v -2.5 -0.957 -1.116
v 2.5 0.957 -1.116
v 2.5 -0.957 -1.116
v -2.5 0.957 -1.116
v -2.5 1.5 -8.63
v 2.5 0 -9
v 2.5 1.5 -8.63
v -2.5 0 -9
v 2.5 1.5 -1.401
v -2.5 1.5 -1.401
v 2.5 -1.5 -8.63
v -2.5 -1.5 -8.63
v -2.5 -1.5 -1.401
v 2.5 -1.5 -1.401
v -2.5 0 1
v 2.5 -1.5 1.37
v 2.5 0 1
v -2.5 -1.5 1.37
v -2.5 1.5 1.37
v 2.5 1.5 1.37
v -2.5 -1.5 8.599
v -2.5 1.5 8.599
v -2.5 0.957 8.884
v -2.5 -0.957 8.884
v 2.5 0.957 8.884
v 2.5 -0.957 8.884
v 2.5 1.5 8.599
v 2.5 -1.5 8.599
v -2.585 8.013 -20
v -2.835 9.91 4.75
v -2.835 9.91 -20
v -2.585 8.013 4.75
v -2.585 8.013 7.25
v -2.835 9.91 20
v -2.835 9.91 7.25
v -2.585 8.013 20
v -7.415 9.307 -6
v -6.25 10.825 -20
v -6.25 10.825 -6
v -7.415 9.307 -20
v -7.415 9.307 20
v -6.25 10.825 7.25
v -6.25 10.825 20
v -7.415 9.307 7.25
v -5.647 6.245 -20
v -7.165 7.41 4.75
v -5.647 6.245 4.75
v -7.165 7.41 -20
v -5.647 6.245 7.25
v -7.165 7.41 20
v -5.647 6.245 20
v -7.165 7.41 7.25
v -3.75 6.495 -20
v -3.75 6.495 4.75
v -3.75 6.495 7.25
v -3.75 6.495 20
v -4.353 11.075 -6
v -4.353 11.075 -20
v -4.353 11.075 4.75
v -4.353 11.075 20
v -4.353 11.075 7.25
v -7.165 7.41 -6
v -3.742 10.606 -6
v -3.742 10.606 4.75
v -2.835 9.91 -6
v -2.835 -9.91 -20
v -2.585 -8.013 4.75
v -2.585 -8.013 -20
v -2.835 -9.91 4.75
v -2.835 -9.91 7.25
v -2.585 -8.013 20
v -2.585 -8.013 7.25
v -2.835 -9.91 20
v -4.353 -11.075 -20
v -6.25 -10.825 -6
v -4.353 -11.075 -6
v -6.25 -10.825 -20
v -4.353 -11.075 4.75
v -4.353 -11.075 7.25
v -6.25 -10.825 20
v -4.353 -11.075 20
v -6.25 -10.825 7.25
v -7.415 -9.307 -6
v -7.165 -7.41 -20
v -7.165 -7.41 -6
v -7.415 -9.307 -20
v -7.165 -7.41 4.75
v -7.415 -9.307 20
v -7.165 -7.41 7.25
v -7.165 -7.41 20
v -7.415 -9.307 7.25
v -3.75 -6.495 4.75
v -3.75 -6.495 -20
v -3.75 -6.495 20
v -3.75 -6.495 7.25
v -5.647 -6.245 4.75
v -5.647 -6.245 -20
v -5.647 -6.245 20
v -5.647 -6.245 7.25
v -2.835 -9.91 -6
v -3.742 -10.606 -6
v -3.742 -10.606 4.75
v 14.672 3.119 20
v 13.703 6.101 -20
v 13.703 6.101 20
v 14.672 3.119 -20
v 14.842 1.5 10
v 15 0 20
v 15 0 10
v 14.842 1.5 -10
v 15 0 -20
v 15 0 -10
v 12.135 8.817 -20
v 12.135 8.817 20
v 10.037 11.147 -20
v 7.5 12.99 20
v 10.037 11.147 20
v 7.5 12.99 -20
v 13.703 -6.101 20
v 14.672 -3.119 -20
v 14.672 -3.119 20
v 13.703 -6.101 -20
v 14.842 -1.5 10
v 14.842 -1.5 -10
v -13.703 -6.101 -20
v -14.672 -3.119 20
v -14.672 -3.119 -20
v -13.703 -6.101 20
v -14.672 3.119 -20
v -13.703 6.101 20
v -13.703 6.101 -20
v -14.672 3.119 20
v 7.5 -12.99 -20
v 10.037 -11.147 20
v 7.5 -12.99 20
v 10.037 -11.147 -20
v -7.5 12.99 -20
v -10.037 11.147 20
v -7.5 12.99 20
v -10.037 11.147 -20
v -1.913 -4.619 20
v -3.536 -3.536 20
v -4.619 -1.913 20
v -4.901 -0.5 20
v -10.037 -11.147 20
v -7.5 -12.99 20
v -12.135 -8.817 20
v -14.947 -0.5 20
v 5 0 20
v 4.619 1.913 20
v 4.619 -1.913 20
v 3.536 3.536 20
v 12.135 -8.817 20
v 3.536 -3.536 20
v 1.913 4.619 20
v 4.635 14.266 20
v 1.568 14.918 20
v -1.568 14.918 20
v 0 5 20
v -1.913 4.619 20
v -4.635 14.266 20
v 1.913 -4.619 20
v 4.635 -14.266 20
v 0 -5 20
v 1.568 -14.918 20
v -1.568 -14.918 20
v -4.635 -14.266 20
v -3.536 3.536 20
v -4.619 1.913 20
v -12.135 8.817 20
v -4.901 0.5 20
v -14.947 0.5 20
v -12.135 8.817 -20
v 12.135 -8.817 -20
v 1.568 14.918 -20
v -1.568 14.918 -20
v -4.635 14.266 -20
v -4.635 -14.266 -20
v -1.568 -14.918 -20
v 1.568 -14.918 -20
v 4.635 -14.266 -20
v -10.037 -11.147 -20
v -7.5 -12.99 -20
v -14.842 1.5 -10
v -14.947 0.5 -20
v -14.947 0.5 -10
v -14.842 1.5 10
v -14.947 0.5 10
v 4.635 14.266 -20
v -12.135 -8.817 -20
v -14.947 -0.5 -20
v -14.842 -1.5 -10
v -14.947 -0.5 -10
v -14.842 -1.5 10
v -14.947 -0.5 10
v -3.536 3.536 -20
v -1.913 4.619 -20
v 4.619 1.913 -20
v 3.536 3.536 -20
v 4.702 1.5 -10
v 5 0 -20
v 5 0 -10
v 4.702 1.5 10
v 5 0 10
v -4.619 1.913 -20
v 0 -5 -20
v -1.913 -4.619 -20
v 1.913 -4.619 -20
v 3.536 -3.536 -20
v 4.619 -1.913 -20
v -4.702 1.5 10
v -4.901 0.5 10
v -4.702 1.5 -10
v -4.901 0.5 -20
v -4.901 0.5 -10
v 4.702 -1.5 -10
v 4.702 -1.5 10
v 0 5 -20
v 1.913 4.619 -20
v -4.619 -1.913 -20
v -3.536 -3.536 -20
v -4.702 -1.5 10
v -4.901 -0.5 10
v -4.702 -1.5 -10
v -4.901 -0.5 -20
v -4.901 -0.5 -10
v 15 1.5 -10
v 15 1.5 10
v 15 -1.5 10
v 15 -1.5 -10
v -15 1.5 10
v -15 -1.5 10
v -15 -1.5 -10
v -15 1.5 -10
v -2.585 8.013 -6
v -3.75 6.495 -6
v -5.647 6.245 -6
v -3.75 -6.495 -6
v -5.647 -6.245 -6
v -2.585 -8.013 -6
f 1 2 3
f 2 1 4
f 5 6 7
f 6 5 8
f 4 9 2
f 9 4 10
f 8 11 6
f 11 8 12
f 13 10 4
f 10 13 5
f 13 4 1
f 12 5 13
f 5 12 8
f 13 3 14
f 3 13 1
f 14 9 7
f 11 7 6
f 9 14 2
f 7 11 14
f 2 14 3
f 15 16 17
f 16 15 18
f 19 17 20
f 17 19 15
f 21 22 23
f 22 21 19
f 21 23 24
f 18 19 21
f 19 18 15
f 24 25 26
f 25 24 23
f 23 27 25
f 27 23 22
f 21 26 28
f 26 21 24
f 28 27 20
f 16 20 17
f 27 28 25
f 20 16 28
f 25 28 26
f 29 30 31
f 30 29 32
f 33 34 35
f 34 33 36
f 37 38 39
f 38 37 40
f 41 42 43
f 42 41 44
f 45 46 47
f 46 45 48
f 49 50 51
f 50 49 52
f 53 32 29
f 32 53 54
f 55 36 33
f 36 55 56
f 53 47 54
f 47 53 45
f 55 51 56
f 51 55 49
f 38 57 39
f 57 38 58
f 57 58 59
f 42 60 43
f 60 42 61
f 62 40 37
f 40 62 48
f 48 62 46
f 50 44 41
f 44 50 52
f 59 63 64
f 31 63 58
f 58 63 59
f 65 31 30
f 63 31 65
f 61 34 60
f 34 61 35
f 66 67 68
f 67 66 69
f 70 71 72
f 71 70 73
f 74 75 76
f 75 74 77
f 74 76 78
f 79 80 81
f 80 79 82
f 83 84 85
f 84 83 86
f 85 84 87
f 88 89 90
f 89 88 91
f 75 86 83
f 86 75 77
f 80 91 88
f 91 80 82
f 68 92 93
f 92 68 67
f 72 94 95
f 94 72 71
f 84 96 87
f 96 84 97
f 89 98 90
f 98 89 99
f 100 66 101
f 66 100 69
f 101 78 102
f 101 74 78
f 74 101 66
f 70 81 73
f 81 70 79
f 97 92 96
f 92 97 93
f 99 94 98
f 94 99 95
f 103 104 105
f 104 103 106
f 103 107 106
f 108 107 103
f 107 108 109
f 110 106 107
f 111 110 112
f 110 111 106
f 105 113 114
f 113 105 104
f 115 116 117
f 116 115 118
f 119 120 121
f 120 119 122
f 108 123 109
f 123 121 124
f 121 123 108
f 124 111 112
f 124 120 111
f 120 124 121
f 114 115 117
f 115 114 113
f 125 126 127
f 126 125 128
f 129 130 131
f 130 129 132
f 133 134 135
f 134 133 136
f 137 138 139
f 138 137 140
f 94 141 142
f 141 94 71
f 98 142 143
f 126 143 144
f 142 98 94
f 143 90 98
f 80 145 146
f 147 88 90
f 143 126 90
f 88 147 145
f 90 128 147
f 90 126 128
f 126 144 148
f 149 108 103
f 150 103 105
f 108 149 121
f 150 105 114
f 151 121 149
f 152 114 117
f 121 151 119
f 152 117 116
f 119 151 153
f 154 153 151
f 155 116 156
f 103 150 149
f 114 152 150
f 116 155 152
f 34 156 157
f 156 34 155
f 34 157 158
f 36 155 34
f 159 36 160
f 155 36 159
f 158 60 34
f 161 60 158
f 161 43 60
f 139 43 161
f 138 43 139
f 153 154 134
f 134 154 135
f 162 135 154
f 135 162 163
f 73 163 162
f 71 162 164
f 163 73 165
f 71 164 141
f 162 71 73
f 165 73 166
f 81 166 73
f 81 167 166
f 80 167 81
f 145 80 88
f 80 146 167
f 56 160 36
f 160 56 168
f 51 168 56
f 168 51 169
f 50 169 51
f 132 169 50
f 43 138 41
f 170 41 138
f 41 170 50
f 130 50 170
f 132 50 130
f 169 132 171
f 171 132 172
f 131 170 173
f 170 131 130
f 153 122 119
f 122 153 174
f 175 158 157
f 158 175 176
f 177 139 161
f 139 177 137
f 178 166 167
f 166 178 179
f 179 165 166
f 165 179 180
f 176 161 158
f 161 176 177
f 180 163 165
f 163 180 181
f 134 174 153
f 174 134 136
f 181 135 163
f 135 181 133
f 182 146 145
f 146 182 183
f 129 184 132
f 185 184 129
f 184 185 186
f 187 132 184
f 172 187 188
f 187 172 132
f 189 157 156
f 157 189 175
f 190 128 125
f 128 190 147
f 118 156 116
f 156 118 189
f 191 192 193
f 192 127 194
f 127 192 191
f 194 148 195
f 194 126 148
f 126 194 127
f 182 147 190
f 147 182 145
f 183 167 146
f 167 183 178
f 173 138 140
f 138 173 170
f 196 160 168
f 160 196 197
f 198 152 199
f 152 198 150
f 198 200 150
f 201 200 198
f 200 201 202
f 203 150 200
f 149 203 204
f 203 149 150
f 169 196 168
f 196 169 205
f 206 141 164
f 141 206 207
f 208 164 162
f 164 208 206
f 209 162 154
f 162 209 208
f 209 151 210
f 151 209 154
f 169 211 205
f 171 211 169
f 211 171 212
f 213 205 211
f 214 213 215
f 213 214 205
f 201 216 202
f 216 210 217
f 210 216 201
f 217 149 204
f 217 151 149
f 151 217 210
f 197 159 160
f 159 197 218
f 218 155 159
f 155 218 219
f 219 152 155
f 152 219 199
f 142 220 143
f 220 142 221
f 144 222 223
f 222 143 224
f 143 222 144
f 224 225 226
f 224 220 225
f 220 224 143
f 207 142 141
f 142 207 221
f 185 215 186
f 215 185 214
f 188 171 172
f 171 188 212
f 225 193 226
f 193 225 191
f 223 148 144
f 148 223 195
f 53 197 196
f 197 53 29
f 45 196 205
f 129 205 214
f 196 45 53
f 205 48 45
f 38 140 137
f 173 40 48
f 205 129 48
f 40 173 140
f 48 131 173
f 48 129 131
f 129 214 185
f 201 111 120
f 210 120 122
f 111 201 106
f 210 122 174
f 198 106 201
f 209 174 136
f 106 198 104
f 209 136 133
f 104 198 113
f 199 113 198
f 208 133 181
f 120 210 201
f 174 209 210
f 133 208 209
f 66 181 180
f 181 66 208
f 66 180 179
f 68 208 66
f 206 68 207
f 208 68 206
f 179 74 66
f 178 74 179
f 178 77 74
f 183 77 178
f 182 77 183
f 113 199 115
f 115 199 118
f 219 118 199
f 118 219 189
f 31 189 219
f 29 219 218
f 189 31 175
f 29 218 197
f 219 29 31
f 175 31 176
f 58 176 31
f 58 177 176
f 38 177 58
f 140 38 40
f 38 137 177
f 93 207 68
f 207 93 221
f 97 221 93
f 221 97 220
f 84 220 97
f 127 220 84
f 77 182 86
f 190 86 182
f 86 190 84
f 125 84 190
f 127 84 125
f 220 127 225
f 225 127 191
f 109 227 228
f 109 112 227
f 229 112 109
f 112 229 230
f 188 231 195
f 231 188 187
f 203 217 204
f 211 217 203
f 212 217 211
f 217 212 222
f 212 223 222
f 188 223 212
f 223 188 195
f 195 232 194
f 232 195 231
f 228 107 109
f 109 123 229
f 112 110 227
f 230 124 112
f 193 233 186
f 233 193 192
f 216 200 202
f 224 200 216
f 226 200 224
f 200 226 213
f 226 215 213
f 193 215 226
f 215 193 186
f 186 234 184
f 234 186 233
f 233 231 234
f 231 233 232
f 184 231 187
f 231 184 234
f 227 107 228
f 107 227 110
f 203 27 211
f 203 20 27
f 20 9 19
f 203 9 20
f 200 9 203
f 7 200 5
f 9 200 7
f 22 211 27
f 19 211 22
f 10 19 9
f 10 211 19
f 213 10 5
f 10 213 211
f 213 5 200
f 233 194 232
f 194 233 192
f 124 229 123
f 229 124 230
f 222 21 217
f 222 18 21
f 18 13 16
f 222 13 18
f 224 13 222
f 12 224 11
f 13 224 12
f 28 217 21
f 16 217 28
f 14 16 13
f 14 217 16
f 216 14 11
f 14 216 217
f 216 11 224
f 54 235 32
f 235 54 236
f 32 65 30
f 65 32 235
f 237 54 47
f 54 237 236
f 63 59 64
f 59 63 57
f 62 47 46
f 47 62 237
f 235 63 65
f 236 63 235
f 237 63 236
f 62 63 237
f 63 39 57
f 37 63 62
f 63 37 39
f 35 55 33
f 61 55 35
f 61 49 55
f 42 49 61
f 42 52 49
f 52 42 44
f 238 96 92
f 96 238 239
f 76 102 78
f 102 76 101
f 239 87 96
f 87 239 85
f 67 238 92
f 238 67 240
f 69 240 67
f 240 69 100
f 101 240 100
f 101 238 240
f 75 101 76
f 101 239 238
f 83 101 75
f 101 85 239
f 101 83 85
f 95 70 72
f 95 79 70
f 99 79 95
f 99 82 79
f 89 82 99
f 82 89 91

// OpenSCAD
// Parameters
clamp_diameter = 30;
clamp_length = 20;
shaft_hole_diameter = 10;
fastener_hole_diameter = 5;
fastener_hole_offset = 10;
slit_width = 1;
cutout_depth = 5;
cutout_width = 8;
flexible_element_thickness = 3;
screw_head_diameter = 8;
screw_length = 12;

// Module for a single clamping half
module clamping_half() {
    difference() {
        // Main cylindrical body
        cylinder(d=clamp_diameter, h=clamp_length, center=true);
        
        // Shaft hole
        cylinder(d=shaft_hole_diameter, h=clamp_length+2, center=true);
        
        // Fastener holes
        for (angle = [120, 240]) {
            rotate([0, 0, angle])
                translate([fastener_hole_offset, 0, 0])
                cylinder(d=fastener_hole_diameter, h=clamp_length+2, center=true);
        }
        
        // Slit for clamping action
        translate([-clamp_diameter/2, 0, 0])
            cube([clamp_diameter, slit_width, clamp_length+2], center=true);
        
        // Side cutouts for flexible element
        for (z_offset = [-clamp_length/4, clamp_length/4]) {
            translate([0, 0, z_offset])
                rotate([0, 90, 0])
                cylinder(d=cutout_width, h=cutout_depth, center=true);
        }
    }
}

// Module for the flexible element
module flexible_element() {
    difference() {
        // Main flexible insert
        cube([clamp_diameter, flexible_element_thickness, clamp_length], center=true);
        
        // Cutouts to fit into the clamping halves
        for (z_offset = [-clamp_length/4, clamp_length/4]) {
            translate([0, 0, z_offset])
                rotate([0, 90, 0])
                cylinder(d=cutout_width, h=cutout_depth, center=true);
        }
    }
}

// Module for fastening screws
module fastening_screw() {
    union() {
        // Screw body
        cylinder(d=fastener_hole_diameter, h=screw_length, center=true);
        
        // Screw head
        translate([0, 0, screw_length/2])
            cylinder(d=screw_head_diameter, h=fastener_hole_diameter/2, center=true);
    }
}

// Assemble the coupling
module flexible_coupling() {
    // Top clamping half
    translate([0, 0, clamp_length/2])
        clamping_half();
    
    // Bottom clamping half (mirrored)
    translate([0, 0, -clamp_length/2])
        mirror([0, 0, 1])
        clamping_half();
    
    // Flexible element
    flexible_element();
    
    // Fastening screws
    for (angle = [120, 240]) {
        rotate([0, 0, angle])
            translate([fastener_hole_offset, 0, 0])
            fastening_screw();
    }
}

// Render the model
flexible_coupling();
